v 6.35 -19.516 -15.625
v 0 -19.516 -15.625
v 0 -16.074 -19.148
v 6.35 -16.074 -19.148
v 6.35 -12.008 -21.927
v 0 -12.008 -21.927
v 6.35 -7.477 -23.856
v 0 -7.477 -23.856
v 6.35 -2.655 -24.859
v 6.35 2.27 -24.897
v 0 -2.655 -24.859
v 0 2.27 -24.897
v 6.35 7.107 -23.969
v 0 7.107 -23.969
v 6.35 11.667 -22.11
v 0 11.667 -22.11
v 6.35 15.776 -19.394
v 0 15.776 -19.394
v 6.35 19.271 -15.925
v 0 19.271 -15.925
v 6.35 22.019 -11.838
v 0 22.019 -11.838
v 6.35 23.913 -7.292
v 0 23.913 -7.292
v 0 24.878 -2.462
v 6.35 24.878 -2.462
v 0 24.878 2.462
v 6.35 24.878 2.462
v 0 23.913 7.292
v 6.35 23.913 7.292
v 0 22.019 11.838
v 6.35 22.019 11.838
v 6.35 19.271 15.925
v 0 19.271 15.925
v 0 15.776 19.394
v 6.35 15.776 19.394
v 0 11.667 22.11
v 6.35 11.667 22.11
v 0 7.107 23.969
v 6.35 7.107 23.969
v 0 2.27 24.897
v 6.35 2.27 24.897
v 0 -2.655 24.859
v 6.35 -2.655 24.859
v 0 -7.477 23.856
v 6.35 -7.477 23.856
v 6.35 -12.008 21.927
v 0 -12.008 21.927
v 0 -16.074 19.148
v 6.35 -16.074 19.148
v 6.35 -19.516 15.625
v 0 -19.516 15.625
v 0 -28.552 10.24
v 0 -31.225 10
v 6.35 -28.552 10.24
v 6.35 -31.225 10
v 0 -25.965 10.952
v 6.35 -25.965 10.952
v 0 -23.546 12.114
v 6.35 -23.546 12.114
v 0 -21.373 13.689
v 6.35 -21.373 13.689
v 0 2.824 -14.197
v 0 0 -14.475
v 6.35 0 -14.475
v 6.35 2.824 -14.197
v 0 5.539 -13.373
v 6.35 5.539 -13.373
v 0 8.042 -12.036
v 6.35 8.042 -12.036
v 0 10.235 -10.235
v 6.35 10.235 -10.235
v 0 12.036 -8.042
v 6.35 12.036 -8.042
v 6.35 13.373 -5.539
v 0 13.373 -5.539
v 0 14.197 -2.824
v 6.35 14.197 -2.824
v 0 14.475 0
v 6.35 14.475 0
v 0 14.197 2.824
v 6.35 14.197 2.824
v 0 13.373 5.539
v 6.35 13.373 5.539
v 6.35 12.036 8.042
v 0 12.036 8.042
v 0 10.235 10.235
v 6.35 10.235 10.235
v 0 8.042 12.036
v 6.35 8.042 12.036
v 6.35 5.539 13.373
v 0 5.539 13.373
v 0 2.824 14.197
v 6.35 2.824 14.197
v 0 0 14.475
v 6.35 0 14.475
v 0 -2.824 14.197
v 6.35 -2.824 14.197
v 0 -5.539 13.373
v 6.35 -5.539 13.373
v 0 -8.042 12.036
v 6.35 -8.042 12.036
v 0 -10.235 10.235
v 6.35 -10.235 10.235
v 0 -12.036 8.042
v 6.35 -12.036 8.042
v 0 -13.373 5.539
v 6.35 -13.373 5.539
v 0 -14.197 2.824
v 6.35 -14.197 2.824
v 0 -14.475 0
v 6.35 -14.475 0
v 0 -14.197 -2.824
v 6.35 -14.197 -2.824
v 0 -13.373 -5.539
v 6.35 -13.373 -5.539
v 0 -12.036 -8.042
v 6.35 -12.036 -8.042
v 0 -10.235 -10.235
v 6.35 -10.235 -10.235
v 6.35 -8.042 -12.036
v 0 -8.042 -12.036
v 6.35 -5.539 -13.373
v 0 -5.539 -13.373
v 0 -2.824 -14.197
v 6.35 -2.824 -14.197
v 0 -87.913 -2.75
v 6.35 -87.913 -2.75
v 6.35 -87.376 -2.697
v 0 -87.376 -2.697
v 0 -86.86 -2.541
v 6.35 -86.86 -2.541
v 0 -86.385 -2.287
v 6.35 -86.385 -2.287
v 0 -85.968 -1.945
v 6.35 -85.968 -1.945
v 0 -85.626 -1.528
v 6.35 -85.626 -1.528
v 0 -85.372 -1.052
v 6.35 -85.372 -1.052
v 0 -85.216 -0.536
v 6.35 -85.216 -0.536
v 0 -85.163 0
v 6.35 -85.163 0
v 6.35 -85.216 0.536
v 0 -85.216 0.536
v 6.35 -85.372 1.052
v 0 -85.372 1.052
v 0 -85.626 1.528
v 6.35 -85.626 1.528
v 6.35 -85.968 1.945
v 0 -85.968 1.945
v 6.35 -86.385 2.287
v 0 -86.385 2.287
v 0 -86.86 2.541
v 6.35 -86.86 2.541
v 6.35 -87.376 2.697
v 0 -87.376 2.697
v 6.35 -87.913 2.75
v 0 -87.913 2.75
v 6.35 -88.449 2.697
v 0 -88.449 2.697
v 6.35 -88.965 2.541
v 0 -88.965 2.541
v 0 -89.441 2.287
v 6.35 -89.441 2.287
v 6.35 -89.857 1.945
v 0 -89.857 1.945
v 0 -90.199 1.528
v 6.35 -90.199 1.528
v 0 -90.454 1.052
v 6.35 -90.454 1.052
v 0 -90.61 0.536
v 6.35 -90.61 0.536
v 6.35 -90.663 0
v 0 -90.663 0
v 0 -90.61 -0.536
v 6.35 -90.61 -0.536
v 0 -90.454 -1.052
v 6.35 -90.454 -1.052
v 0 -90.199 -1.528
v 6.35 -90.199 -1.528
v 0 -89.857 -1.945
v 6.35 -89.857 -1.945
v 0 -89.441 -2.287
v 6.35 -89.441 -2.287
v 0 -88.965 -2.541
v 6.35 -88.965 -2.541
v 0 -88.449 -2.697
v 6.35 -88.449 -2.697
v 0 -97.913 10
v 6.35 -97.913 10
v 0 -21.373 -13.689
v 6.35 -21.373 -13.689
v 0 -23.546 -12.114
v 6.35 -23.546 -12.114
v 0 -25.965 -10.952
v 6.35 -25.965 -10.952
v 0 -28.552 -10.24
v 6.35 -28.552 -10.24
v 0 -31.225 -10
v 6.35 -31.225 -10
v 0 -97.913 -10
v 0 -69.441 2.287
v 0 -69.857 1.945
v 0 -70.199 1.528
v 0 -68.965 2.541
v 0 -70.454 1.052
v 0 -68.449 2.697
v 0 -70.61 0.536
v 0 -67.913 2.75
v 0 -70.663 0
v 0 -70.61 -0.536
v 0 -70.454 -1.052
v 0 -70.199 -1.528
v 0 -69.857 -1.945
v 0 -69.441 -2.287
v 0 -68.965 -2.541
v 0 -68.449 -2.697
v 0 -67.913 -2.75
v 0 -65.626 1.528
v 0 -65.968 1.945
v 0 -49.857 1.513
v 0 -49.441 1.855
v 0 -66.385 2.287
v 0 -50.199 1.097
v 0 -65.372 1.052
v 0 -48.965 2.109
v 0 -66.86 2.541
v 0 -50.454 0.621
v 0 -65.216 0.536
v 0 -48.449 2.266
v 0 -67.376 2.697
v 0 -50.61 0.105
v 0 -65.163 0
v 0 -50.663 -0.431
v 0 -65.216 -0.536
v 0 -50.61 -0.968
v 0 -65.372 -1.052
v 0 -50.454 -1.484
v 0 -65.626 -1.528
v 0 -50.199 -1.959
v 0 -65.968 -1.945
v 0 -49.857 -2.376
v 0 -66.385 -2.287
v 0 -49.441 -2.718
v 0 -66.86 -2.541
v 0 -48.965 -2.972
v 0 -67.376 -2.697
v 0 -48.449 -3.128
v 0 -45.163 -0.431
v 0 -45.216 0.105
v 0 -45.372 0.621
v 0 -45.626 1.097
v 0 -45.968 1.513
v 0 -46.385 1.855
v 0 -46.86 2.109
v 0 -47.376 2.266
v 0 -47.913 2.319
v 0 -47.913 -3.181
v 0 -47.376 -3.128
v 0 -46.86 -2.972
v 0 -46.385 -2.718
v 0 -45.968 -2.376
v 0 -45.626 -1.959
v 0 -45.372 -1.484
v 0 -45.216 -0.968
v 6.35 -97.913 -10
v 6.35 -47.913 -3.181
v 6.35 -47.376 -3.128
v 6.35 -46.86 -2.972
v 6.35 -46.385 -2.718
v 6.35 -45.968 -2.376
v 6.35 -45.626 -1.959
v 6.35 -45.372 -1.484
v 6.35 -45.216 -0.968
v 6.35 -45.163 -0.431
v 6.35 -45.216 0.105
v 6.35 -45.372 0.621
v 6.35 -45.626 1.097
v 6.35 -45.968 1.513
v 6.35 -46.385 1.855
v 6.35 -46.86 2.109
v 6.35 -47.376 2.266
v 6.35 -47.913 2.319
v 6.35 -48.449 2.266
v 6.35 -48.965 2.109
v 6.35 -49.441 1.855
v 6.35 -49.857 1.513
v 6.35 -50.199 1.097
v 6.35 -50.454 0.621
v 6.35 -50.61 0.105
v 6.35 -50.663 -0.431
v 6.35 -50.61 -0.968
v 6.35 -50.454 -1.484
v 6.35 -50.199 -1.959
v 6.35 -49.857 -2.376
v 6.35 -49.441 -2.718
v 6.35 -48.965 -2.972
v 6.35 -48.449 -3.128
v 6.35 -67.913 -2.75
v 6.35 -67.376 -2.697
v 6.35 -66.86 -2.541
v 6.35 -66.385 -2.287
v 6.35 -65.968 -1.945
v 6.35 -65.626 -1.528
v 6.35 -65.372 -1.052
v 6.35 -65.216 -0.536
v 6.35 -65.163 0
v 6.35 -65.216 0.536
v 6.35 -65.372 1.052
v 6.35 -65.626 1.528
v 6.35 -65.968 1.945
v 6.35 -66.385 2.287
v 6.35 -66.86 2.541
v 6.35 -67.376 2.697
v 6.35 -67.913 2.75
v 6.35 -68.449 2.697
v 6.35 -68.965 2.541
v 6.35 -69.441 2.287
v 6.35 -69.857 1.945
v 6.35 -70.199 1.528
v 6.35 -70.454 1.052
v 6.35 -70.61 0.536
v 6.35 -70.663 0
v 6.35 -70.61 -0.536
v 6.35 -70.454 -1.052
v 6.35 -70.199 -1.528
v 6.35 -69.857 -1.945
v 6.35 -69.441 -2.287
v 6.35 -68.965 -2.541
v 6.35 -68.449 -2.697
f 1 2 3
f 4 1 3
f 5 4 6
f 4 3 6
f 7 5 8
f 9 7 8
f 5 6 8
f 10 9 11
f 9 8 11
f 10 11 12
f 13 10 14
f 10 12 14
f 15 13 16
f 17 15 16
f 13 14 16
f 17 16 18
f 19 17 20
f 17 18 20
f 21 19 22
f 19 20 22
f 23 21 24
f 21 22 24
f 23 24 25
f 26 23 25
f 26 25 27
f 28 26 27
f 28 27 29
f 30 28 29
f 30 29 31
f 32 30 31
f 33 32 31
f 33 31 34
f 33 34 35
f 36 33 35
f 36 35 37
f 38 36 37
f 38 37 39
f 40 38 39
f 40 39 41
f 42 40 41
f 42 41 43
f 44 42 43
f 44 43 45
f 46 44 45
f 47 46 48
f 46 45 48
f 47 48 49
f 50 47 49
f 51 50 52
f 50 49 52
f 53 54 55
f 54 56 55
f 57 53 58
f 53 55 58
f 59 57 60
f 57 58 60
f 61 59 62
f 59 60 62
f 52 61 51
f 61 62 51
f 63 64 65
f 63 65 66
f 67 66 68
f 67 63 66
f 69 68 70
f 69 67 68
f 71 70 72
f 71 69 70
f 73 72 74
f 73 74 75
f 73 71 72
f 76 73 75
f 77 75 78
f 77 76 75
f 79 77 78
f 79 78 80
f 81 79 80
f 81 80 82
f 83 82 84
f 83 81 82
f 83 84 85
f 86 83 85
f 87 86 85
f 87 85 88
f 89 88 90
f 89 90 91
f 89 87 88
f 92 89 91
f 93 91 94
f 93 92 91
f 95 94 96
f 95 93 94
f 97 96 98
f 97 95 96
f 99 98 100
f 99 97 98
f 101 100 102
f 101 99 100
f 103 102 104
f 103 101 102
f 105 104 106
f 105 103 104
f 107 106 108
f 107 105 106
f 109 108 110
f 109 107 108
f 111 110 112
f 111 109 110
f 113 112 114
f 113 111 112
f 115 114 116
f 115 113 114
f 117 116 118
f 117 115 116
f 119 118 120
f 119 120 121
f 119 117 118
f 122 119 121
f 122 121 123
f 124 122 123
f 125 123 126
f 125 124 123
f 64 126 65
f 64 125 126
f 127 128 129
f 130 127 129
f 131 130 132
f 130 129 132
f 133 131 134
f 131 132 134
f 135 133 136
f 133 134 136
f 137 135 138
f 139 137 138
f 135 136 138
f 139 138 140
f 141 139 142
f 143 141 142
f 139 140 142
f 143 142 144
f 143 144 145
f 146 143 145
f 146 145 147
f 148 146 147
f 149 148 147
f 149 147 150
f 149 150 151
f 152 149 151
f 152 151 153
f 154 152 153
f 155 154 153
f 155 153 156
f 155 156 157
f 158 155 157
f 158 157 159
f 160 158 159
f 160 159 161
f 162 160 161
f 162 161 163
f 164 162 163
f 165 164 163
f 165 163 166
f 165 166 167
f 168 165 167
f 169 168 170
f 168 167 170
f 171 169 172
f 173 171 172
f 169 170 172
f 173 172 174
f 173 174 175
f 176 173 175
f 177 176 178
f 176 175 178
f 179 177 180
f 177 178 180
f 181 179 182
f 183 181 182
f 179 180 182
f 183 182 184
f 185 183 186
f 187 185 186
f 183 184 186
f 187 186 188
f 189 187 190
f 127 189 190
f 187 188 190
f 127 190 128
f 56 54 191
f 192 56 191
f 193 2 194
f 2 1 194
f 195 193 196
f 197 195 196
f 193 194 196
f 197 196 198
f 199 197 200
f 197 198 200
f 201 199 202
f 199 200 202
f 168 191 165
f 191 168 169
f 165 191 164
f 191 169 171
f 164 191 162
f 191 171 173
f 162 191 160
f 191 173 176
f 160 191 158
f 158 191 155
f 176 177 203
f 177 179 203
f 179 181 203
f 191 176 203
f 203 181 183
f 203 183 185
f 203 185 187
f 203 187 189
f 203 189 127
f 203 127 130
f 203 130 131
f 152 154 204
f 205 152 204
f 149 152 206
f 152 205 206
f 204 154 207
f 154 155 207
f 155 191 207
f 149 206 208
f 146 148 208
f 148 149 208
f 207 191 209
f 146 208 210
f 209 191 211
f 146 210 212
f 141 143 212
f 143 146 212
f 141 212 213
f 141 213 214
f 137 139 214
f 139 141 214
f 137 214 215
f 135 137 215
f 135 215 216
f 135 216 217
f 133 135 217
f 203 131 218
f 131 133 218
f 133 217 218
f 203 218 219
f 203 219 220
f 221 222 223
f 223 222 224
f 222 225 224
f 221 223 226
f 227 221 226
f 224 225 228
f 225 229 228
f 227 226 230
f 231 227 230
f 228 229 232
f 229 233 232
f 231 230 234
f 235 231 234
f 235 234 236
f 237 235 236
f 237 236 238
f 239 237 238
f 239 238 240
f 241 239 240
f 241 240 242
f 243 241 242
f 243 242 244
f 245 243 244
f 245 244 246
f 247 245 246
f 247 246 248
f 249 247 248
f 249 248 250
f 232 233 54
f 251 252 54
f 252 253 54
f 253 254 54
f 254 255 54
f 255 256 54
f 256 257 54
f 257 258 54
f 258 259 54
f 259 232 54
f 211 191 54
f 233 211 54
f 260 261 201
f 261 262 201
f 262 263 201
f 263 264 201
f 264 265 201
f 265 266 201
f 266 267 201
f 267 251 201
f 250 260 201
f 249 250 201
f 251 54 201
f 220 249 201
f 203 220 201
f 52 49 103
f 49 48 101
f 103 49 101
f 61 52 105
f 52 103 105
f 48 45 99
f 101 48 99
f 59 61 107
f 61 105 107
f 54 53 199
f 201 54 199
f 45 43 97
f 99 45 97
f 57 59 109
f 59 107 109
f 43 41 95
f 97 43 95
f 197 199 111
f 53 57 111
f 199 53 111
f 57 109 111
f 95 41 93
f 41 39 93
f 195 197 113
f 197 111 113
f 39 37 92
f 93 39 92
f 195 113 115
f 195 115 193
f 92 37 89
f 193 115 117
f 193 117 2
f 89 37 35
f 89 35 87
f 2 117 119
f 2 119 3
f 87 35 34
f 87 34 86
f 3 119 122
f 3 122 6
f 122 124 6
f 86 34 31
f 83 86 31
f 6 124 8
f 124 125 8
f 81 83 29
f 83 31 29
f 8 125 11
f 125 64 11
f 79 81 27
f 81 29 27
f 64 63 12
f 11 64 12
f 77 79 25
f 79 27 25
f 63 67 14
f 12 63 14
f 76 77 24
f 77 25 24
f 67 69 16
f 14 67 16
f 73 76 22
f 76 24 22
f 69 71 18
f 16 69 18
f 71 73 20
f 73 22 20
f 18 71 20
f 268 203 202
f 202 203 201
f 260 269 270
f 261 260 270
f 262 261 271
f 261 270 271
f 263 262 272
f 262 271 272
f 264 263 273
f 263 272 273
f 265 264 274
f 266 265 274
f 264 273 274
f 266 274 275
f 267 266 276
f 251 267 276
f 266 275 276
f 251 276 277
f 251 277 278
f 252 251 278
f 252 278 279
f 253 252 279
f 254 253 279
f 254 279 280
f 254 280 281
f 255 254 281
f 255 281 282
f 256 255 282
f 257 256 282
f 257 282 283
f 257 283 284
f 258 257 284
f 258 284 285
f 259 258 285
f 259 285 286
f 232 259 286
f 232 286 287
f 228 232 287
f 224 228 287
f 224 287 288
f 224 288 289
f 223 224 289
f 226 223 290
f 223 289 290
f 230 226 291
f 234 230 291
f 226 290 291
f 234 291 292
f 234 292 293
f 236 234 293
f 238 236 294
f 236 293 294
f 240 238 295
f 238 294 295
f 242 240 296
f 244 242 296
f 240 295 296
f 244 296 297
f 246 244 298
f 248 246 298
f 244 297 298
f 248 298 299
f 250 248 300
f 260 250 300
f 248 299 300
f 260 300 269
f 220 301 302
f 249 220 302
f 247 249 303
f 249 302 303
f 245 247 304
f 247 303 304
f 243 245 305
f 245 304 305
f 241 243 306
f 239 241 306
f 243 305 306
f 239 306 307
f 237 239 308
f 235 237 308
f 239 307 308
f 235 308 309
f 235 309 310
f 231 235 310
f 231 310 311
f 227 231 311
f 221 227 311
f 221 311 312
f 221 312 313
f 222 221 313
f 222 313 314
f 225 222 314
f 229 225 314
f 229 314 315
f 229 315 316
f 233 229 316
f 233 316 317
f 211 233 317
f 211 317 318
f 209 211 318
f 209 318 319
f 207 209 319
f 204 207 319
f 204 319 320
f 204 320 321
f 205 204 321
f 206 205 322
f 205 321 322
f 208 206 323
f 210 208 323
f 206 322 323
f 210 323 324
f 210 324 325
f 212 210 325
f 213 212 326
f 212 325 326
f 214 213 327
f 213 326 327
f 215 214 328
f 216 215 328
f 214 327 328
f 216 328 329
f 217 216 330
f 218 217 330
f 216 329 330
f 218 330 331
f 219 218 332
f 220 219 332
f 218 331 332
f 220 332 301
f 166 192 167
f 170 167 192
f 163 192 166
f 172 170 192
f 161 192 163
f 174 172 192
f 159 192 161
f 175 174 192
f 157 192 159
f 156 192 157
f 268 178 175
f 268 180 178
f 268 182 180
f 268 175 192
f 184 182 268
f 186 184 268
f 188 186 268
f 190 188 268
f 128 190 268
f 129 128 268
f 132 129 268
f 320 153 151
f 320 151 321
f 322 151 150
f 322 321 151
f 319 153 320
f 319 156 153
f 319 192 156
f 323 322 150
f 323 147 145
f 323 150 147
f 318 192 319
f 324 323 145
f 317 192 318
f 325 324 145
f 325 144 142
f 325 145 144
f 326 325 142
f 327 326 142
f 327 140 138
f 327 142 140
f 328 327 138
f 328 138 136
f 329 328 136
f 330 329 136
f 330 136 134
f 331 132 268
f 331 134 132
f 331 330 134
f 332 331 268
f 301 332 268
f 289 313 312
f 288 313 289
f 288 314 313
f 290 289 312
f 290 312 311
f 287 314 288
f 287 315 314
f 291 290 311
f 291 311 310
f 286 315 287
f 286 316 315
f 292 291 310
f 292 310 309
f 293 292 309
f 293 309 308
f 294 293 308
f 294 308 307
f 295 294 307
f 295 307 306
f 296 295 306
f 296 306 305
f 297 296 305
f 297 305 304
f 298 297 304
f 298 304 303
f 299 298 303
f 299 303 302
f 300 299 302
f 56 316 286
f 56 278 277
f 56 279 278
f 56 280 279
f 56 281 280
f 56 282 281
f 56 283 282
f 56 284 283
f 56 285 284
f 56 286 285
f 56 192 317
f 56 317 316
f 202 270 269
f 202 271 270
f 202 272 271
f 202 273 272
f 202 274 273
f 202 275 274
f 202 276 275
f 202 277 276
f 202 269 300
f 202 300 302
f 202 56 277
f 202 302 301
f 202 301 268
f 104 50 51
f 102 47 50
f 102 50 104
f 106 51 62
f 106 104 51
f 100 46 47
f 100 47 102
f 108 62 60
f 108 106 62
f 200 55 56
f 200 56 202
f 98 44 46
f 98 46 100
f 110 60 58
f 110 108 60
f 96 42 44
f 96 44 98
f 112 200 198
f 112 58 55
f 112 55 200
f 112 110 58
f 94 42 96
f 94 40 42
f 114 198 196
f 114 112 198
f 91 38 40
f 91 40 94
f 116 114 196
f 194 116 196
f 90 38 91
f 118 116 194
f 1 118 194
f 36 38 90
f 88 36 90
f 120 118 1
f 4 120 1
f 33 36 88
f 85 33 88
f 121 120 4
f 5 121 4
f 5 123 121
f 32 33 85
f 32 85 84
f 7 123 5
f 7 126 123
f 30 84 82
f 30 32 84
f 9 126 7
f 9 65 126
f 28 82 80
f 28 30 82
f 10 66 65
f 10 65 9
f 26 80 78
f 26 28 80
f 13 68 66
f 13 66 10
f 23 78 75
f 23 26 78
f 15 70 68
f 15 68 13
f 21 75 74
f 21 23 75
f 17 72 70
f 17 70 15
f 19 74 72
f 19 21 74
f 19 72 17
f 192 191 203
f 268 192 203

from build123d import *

# Parameters (mm, degrees)
SKETCH1_R           = 14.475
BOSS_EXTRUDE1_DEPTH = 6.35
SKETCH2_R           = 2.75
CUT_EXTRUDE1_DEPTH  = 7.35
FILLET1_R           = 15


with BuildPart() as part:
    # Sketch1 → Boss-Extrude1 (new body)
    with BuildSketch(Plane(origin=(0, 0, 0), x_dir=(0, 0, -1), z_dir=(1, 0, 0))):
        with BuildLine():
            Line((-10, -22.912878475), (-10, -97.912878475))
            Line((-10, -97.912878475), (10, -97.912878475))
            Line((10, -97.912878475), (10, -22.912878475))
            ThreePointArc((10, -22.912878475), (0, 25), (-10, -22.912878475))
        make_face()
        Circle(SKETCH1_R, mode=Mode.SUBTRACT)
    extrude(amount=BOSS_EXTRUDE1_DEPTH)

    # Sketch2 → Cut-Extrude1 (cut, through all)
    with BuildSketch(Plane(origin=(6.35, 0, 0), x_dir=(0, 0, -1), z_dir=(1, 0, 0))):
        with Locations((0, -87.912878475)):
            Circle(SKETCH2_R)
        with Locations((0, -67.912878475)):
            Circle(SKETCH2_R)
        with Locations((0.431184648, -47.912878475)):
            Circle(SKETCH2_R)
    extrude(amount=-CUT_EXTRUDE1_DEPTH, mode=Mode.SUBTRACT)

    # Fillet1
    fillet1_edges = [part.edges().sort_by_distance(p)[0] for p in [
        (3.175, -22.912878475, 10),
        (3.175, -22.912878475, -10),
    ]]
    fillet(fillet1_edges, radius=FILLET1_R)


solid = part.part
